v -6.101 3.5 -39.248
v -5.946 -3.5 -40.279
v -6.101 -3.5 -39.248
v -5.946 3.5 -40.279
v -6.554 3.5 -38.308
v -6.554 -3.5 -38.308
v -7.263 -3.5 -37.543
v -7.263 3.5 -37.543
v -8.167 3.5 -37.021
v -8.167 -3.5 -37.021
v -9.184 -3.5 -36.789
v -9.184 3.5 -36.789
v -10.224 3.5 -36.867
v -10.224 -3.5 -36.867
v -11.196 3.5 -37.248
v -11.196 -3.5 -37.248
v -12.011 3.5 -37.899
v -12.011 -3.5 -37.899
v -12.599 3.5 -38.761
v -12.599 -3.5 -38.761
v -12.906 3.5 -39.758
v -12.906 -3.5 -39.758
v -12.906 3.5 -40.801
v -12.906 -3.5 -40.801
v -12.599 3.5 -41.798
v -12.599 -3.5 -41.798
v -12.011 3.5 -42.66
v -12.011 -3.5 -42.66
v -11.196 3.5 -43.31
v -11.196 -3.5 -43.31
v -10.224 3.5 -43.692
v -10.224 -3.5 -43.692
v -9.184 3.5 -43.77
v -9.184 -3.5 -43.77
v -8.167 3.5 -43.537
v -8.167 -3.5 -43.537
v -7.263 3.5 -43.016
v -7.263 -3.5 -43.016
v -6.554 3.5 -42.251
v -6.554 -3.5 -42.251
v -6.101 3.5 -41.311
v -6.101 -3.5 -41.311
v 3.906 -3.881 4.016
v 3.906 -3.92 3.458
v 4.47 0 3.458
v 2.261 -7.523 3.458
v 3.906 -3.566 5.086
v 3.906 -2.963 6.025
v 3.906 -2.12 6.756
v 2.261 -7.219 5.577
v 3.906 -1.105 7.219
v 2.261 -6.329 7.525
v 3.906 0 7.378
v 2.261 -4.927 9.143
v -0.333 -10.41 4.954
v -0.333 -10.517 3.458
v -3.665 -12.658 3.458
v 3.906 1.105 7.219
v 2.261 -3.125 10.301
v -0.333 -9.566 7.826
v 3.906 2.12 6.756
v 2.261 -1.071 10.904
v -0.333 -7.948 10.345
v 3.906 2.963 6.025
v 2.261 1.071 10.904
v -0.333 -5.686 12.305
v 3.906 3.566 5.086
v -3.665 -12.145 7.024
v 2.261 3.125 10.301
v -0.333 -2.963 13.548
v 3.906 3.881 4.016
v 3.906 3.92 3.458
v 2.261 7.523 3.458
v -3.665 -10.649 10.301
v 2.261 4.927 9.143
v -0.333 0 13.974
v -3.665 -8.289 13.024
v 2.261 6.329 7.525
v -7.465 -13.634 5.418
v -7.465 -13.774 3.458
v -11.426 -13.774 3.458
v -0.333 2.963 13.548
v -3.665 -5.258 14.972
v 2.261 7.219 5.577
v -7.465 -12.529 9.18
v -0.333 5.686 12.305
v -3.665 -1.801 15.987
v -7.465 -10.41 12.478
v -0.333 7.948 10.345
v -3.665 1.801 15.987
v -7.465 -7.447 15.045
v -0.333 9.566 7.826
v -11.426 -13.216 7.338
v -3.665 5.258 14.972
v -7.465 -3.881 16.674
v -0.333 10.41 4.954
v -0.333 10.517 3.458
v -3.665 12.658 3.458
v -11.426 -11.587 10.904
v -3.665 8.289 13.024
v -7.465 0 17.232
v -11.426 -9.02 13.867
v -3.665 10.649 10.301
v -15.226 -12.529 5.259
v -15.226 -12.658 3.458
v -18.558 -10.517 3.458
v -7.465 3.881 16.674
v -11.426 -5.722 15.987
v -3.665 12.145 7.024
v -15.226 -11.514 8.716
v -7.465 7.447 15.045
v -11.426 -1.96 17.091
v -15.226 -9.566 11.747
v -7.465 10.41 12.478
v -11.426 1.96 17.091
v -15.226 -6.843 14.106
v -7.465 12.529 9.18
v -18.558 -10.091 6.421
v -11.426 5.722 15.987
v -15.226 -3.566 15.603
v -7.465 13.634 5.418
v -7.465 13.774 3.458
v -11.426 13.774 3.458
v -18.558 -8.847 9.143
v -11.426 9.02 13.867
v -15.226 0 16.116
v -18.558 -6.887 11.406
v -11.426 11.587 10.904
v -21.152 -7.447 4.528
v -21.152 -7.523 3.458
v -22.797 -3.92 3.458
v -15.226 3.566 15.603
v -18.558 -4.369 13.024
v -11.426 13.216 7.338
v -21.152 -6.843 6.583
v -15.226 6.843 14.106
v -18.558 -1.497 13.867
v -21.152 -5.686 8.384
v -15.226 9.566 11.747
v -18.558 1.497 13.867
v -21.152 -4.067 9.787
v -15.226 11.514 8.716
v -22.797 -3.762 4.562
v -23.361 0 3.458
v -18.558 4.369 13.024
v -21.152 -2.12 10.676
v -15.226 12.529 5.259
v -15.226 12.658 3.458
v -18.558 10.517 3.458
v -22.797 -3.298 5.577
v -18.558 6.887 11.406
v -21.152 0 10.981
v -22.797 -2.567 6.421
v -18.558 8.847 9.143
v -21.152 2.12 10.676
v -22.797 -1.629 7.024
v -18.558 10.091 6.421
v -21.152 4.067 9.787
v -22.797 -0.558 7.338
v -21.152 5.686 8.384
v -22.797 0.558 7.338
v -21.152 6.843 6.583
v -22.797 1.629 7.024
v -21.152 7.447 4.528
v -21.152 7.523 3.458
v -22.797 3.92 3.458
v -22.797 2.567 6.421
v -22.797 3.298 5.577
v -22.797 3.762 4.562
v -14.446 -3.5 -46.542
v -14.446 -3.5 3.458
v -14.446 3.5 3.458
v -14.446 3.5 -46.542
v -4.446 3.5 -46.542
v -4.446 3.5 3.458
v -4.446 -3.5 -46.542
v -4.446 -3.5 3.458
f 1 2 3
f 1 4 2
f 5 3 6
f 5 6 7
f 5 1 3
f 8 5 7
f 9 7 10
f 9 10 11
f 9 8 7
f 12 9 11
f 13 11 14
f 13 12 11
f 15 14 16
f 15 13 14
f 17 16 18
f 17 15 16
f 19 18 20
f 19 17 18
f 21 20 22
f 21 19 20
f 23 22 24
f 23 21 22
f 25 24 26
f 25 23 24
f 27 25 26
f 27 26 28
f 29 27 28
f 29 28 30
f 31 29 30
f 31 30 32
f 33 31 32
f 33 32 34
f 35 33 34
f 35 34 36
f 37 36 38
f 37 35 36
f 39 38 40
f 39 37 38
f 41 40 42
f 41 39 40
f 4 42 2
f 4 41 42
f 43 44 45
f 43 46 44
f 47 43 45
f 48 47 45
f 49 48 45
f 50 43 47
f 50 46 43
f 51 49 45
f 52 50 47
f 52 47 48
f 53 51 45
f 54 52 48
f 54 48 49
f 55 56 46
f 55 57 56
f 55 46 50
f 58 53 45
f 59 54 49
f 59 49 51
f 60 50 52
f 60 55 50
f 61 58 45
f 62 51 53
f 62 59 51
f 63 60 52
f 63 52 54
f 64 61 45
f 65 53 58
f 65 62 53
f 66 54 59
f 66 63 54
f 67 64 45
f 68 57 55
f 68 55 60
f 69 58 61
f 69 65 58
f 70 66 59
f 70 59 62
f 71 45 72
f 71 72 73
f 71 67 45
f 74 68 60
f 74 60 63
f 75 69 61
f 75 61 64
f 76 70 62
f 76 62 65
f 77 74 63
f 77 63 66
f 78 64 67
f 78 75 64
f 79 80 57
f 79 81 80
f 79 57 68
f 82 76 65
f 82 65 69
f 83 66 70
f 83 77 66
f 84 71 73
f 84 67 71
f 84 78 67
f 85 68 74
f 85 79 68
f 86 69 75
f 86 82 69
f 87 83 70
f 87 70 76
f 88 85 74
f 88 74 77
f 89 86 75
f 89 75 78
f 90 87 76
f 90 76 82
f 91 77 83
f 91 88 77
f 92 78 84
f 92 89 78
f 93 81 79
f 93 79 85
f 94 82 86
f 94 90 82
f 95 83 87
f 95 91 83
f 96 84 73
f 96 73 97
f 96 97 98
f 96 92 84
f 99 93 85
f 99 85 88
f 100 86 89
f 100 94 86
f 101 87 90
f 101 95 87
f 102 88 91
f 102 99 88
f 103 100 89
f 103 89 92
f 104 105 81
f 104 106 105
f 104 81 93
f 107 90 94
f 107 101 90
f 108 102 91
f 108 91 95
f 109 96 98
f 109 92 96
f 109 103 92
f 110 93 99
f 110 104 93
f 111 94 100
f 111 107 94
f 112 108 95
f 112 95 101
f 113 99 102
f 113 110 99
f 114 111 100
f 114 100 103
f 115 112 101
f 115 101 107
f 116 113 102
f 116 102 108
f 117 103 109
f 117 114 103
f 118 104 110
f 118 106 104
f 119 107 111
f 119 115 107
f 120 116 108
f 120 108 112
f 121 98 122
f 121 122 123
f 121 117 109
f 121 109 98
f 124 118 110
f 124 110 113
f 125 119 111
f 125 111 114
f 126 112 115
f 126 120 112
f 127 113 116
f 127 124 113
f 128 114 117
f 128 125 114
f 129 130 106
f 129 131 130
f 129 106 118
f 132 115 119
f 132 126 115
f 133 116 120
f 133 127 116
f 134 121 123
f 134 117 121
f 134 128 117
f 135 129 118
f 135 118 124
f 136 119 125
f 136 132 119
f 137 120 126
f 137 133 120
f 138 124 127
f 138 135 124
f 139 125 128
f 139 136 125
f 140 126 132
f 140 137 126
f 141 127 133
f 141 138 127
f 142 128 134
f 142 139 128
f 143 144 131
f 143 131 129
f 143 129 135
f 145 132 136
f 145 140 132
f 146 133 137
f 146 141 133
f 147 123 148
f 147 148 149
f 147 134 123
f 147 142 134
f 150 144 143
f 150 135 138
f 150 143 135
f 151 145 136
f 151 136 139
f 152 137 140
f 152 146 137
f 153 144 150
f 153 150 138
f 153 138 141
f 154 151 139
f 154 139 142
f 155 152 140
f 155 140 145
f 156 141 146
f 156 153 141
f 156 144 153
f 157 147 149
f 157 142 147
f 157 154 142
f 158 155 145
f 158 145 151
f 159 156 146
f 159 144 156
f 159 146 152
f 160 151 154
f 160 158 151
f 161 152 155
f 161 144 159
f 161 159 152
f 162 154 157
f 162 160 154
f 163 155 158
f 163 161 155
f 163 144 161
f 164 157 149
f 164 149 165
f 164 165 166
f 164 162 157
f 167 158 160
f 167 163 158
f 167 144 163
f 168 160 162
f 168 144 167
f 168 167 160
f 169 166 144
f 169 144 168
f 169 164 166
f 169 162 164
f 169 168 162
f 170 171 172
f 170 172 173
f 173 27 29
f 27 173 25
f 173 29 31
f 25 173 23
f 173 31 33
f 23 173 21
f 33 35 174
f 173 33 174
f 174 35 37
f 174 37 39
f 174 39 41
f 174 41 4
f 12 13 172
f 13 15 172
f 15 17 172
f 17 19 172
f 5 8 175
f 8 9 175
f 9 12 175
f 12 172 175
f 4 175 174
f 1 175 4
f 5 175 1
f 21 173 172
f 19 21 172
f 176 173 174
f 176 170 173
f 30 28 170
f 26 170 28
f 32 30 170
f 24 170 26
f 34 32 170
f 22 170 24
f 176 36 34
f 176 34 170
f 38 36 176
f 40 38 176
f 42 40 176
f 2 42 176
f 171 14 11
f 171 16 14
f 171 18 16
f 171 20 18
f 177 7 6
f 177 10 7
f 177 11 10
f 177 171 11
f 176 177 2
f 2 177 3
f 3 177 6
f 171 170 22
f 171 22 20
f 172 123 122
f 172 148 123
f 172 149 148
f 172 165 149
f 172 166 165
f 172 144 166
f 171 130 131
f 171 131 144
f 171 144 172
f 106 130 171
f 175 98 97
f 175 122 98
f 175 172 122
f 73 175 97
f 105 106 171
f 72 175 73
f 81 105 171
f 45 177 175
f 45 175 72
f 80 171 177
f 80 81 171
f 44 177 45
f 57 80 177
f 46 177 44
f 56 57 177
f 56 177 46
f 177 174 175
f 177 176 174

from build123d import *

# Parameters (mm, degrees)
F0_R          = 3.5
F1_DEPTH      = 3.5
F2_ANGLE_BACK = 90
F2_ANGLE      = 180


# Not quite as in the source:
# - a feature of the source that left no trace in its solid (it failed there, or was rolled back) is left out


with BuildPart() as f1:
    # F0 (on Front) → F1 (new body, symmetric)
    with BuildSketch(Plane.XZ):
        with BuildLine():
            ThreePointArc((-4.4455649331, -9.5285820105), (-9.4455649331, -10.4578883784), (-14.4455649331, -9.5285820105))
            Line((-14.4455649331, -9.5285820105), (-14.4455649331, -46.5423427522))
            Line((-14.4455649331, -46.5423427522), (-4.4455649331, -46.5423427522))
            Line((-4.4455649331, -46.5423427522), (-4.4455649331, -9.5285820105))
        make_face()
        with Locations((-9.4455649331, -40.2793101966)):
            Circle(F0_R, mode=Mode.SUBTRACT)
        with BuildLine():
            Line((-4.4455649331, 3.4576572478), (-14.4455649331, 3.4576572478))
            Line((-14.4455649331, 3.4576572478), (-14.4455649331, -9.5285820105))
            ThreePointArc((-14.4455649331, -9.5285820105), (-9.4455649331, -10.4578883784), (-4.4455649331, -9.5285820105))
            Line((-4.4455649331, -9.5285820105), (-4.4455649331, 3.4576572478))
        make_face()
    extrude(amount=F1_DEPTH, both=True)

    # F0 (on Front) → F2 (revolve)
    with BuildSketch(Plane.XZ, mode=Mode.PRIVATE) as f2_sk:
        with BuildLine():
            Line((-23.3611105593, 3.4576572478), (-14.4455649331, 3.4576572478))
            Line((-14.4455649331, 3.4576572478), (-4.4455649331, 3.4576572478))
            Line((-4.4455649331, 3.4576572478), (4.469980693, 3.4576572478))
            ThreePointArc((4.469980693, 3.4576572478), (-9.4455649331, 17.3732028739), (-23.3611105593, 3.4576572478))
        make_face()
    revolve(f2_sk.sketch.rotate(Axis((-13.6577822268, 0, 3.4576572478), (-1, 0, 0)), -F2_ANGLE_BACK), axis=Axis((-13.6577822268, 0, 3.4576572478), (-1, 0, 0)), revolution_arc=F2_ANGLE)


solid = f1.part
